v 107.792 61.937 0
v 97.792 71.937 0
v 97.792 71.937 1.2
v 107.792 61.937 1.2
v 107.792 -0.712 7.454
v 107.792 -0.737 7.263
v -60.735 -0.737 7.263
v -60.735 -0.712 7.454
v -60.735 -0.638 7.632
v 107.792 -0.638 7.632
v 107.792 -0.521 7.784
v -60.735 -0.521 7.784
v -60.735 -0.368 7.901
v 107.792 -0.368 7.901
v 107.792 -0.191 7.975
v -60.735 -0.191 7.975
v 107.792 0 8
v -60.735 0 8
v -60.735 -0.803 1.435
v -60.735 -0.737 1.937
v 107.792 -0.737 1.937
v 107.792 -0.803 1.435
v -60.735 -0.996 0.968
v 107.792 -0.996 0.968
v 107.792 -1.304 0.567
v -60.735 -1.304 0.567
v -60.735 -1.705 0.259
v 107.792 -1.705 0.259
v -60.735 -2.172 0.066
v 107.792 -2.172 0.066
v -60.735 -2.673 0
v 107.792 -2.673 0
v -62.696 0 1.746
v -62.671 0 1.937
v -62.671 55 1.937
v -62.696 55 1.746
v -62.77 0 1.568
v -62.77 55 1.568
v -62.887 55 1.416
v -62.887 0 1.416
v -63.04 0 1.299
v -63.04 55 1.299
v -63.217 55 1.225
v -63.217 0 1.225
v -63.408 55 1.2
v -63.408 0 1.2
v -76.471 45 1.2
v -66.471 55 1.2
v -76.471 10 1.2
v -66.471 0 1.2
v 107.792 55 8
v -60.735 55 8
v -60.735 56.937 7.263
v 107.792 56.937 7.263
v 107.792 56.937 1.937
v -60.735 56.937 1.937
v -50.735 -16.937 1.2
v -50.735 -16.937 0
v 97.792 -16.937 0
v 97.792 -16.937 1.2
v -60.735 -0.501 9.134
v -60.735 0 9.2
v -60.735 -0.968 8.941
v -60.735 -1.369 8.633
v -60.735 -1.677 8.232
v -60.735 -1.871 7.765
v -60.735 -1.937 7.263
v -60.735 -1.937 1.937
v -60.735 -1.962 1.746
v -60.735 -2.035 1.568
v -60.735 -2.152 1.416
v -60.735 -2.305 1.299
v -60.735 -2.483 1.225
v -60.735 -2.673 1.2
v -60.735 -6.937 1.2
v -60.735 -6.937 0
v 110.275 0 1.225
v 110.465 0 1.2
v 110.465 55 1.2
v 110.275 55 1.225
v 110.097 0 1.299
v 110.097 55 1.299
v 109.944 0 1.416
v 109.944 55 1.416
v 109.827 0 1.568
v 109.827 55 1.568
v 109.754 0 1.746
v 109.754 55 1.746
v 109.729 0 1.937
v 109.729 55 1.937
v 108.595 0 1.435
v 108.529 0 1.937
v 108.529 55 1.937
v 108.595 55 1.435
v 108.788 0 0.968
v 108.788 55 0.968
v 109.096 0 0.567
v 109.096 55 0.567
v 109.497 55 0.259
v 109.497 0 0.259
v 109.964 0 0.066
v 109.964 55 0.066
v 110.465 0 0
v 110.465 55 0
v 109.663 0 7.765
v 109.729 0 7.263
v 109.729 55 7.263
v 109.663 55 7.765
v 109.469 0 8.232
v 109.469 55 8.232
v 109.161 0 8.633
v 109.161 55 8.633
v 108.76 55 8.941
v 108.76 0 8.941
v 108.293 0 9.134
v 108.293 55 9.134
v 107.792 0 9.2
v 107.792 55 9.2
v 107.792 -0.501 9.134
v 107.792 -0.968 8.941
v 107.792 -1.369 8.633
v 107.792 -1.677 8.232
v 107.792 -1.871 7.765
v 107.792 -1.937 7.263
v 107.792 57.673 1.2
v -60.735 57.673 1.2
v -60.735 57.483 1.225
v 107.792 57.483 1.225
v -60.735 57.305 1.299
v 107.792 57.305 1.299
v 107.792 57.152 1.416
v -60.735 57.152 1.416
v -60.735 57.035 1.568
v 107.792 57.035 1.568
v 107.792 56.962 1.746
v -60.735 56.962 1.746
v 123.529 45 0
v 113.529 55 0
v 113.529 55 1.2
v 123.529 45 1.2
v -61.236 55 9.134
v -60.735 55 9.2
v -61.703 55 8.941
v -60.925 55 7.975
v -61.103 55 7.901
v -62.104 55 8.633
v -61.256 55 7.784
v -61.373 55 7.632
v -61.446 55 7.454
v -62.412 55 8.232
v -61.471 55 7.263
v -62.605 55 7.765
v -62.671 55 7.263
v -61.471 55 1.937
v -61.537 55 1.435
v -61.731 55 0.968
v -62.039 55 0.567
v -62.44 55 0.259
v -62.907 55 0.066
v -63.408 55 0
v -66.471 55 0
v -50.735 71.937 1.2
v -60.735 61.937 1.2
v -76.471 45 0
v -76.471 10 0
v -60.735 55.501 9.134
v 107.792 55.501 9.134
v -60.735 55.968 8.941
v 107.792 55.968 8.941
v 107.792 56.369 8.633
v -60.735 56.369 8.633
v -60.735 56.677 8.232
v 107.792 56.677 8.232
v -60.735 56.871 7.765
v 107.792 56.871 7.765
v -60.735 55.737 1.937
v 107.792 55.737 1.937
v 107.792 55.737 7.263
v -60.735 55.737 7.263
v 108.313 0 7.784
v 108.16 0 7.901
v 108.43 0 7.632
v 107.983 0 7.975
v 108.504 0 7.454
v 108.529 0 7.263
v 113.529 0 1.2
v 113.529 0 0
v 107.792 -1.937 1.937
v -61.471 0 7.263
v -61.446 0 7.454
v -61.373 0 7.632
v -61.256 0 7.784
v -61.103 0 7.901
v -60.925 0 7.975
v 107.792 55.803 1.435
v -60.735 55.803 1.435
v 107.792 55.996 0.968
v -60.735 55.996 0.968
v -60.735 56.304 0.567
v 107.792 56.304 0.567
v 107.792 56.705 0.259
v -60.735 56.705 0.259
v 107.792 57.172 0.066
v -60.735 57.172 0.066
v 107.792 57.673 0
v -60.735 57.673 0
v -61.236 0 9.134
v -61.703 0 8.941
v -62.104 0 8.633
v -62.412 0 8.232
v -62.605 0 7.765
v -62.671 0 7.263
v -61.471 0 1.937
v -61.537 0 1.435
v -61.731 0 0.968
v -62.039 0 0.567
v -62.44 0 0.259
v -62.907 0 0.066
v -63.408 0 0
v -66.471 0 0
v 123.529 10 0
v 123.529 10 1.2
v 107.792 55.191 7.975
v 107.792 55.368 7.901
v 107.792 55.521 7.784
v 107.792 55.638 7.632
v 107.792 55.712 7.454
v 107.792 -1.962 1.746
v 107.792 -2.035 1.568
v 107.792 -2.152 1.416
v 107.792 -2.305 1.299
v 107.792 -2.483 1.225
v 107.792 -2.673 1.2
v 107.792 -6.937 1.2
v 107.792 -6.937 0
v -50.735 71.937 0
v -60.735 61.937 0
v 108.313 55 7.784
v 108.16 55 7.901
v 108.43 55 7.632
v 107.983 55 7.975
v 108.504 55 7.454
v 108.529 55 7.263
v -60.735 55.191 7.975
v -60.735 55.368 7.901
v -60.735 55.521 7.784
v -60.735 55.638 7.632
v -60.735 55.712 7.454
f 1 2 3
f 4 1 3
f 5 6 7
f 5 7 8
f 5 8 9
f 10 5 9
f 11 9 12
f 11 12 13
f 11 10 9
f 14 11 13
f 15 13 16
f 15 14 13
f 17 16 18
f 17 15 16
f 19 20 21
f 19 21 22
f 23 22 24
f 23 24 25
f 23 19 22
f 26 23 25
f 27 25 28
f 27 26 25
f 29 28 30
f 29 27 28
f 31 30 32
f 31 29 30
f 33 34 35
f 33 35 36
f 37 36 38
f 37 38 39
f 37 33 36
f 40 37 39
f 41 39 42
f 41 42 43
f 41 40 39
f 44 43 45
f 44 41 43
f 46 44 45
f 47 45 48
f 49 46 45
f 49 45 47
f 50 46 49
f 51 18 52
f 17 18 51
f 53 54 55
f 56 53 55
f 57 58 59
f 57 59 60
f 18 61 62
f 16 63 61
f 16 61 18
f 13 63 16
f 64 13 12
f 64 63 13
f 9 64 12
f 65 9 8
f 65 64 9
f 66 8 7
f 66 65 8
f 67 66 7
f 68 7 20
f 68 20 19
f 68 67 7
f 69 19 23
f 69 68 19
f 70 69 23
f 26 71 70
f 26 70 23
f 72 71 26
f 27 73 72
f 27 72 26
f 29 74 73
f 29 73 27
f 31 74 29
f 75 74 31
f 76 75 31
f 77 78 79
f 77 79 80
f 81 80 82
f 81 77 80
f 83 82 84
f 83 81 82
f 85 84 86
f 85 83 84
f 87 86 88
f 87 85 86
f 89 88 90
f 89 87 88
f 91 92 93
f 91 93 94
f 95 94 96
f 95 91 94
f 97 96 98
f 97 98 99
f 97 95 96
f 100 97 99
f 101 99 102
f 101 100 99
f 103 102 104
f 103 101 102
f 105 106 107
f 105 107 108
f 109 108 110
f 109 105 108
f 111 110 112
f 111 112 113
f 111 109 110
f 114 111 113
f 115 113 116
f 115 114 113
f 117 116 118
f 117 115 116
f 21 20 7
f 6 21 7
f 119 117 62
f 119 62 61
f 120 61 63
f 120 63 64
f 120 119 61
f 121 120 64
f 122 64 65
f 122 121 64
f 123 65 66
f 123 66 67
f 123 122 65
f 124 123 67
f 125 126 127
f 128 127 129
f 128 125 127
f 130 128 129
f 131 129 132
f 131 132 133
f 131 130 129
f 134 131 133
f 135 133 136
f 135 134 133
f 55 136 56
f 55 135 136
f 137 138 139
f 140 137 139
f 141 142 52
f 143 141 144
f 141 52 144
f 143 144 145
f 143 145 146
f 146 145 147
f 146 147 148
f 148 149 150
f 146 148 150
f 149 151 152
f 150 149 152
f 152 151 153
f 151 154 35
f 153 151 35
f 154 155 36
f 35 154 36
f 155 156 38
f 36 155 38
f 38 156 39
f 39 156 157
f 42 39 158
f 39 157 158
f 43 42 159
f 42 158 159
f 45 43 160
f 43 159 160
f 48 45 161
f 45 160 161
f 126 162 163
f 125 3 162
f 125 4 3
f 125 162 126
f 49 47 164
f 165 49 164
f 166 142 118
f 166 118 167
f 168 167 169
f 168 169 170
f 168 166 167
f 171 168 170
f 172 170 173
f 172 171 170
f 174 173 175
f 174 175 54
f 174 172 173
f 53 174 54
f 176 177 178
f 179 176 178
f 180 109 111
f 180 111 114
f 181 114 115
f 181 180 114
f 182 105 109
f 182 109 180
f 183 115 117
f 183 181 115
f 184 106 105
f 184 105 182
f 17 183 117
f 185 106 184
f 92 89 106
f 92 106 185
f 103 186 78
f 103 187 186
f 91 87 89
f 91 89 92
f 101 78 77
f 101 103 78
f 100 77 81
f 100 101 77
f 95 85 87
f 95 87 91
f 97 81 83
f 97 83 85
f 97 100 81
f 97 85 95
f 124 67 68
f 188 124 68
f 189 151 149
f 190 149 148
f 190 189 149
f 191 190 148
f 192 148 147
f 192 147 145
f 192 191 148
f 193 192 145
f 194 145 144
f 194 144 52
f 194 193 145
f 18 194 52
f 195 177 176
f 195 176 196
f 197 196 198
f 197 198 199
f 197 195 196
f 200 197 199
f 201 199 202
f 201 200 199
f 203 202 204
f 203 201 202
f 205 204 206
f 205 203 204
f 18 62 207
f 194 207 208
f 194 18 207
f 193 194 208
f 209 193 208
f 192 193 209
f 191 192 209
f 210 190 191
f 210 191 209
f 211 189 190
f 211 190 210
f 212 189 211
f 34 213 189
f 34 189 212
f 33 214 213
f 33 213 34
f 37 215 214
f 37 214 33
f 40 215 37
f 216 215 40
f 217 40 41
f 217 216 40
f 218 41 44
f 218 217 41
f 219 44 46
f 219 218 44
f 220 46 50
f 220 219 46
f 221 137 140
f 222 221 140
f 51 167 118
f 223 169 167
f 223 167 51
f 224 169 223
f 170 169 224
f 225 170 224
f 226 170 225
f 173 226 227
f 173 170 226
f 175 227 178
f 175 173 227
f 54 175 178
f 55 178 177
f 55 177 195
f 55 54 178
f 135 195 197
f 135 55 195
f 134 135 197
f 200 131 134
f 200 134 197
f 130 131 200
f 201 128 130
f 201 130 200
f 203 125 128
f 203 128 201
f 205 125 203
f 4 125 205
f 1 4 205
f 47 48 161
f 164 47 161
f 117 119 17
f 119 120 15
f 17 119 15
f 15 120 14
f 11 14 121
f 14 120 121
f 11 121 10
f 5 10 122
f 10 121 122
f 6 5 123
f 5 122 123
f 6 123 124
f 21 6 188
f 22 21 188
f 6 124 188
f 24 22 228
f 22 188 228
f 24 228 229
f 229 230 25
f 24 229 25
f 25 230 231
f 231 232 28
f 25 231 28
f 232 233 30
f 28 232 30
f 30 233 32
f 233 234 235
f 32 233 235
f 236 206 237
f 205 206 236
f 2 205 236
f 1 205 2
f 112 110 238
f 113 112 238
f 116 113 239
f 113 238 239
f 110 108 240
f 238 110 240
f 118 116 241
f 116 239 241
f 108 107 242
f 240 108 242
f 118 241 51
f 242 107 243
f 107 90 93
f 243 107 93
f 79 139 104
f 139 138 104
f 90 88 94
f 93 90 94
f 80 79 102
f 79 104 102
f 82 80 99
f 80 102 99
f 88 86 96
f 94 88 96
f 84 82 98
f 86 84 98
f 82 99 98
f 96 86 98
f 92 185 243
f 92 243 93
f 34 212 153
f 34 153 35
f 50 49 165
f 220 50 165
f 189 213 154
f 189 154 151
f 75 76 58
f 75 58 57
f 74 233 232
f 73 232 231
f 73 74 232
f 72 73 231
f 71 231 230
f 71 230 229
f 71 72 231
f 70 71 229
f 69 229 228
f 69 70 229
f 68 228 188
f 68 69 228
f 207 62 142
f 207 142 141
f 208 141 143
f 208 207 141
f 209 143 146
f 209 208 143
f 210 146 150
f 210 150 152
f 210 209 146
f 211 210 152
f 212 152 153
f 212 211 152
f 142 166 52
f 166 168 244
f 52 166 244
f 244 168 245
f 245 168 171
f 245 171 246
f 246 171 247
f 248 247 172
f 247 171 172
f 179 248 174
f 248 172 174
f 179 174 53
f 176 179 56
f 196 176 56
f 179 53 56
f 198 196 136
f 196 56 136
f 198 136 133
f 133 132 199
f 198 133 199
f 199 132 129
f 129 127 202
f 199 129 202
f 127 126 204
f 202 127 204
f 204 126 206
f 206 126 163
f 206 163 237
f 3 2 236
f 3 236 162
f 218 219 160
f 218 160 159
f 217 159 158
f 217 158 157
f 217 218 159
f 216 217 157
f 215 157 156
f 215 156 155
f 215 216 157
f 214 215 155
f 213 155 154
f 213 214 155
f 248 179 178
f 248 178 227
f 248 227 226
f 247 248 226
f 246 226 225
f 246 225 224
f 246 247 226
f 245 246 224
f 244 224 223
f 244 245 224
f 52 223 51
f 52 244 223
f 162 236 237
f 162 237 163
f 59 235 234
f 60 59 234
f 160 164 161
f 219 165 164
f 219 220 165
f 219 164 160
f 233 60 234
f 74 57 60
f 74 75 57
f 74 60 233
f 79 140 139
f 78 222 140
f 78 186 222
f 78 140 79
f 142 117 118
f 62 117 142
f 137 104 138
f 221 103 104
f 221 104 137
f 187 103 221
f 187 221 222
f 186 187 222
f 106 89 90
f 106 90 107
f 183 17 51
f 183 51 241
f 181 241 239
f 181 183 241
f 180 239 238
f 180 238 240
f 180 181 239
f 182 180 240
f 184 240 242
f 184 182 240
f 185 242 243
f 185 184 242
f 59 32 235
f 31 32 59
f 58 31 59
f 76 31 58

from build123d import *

# Parameters (mm, degrees)
BASE_FLANGE1_DEPTH           = 55
EDGE_FLANGE1_DEPTH           = 168.5268
EDGE_FLANGE2_STRIP_W         = 6.2732
EDGE_FLANGE2_STRIP_H         = 1.2
EDGE_FLANGE2_STRIP_CUT_DEPTH = 168.5268
EDGE_FLANGE2_DEPTH           = 168.5268
EDGE_FLANGE3_DEPTH           = 168.5268
EDGE_FLANGE4_STRIP_W         = 6.2732
EDGE_FLANGE4_STRIP_H         = 1.2
EDGE_FLANGE4_STRIP_CUT_DEPTH = 168.5268
EDGE_FLANGE4_DEPTH           = 168.5268
CHAMFER1_SIZE                = 10


# Sheet-metal steps are written as plain solids
with BuildPart() as part:
    # Sketch1 → Base-Flange1 (new body)
    with BuildSketch(Plane(origin=(0, 0, 0), x_dir=(1, 0, 0), z_dir=(0, 1, 0))):
        with BuildLine():
            Line((-76.471389646, 0), (-63.407989646, 0))
            ThreePointArc((-63.407989646, 0), (-62.038606653, -0.567217008), (-61.471389646, -1.9366))
            Line((-61.471389646, -1.9366), (-61.471389646, -7.2634))
            ThreePointArc((-61.471389646, -7.2634), (-61.255644501, -7.784254855), (-60.734789646, -8))
            Line((-60.734789646, -8), (107.792010354, -8))
            ThreePointArc((107.792010354, -8), (108.312865209, -7.784254855), (108.528610354, -7.2634))
            Line((108.528610354, -7.2634), (108.528610354, -1.9366))
            ThreePointArc((108.528610354, -1.9366), (109.095827362, -0.567217008), (110.465210354, 0))
            Line((110.465210354, 0), (123.528610354, 0))
            Line((123.528610354, 0), (123.528610354, -1.2))
            Line((123.528610354, -1.2), (110.465210354, -1.2))
            ThreePointArc((110.465210354, -1.2), (109.944355499, -1.415745145), (109.728610354, -1.9366))
            Line((109.728610354, -1.9366), (109.728610354, -7.2634))
            ThreePointArc((109.728610354, -7.2634), (109.161393347, -8.632782992), (107.792010354, -9.2))
            Line((107.792010354, -9.2), (-60.734789646, -9.2))
            ThreePointArc((-60.734789646, -9.2), (-62.104172638, -8.632782992), (-62.671389646, -7.2634))
            Line((-62.671389646, -7.2634), (-62.671389646, -1.9366))
            ThreePointArc((-62.671389646, -1.9366), (-62.887134791, -1.415745145), (-63.407989646, -1.2))
            Line((-63.407989646, -1.2), (-76.471389646, -1.2))
            Line((-76.471389646, -1.2), (-76.471389646, 0))
        make_face()
    extrude(amount=BASE_FLANGE1_DEPTH)

    # Edge-Flange1 section (across the edge) → Edge-Flange1 (add)
    with BuildSketch(Plane(origin=(-60.734789646, 55.7366, 8), x_dir=(0, -1, 0), z_dir=(1, 0, 0))):
        with BuildLine():
            Line((-1.2, 0.7366), (-1.2, 8))
            Line((-1.2, 8), (0, 8))
            Line((0, 8), (0, 0.7366))
            ThreePointArc((0, 0.7366), (0.215745145, 0.215745145), (0.7366, 0))
            Line((0.7366, 0), (0.7366, -1.2))
            ThreePointArc((0.7366, -1.2), (-0.632782992, -0.632782992), (-1.2, 0.7366))
        make_face()
    extrude(amount=EDGE_FLANGE1_DEPTH)

    # Edge-Flange2 strip (across the edge) → Edge-Flange2 strip cut (cut)
    with BuildSketch(Plane(origin=(107.792010354, 56.9366, 0), x_dir=(0, 0, 1), z_dir=(-1, 0, 0))):
        with Locations((-1.2, -0.6)):
            Rectangle(EDGE_FLANGE2_STRIP_W, EDGE_FLANGE2_STRIP_H)
    extrude(amount=EDGE_FLANGE2_STRIP_CUT_DEPTH, mode=Mode.SUBTRACT)

    # Edge-Flange2 section (across the edge) → Edge-Flange2 (add)
    with BuildSketch(Plane(origin=(107.792010354, 56.9366, 0), x_dir=(0, 0, 1), z_dir=(-1, 0, 0))):
        with BuildLine():
            Line((0, 0.7366), (0, 15))
            Line((0, 15), (1.2, 15))
            Line((1.2, 15), (1.2, 0.7366))
            ThreePointArc((1.2, 0.7366), (1.415745145, 0.215745145), (1.9366, 0))
            Line((1.9366, 0), (1.9366, -1.2))
            ThreePointArc((1.9366, -1.2), (0.567217008, -0.632782992), (0, 0.7366))
        make_face()
    extrude(amount=EDGE_FLANGE2_DEPTH)

    # Edge-Flange3 section (across the edge) → Edge-Flange3 (add)
    with BuildSketch(Plane(origin=(107.792010354, -0.7366, 8), x_dir=(0, 1, 0), z_dir=(-1, 0, 0))):
        with BuildLine():
            Line((-1.2, 0.7366), (-1.2, 8))
            Line((-1.2, 8), (0, 8))
            Line((0, 8), (0, 0.7366))
            ThreePointArc((0, 0.7366), (0.215745145, 0.215745145), (0.7366, 0))
            Line((0.7366, 0), (0.7366, -1.2))
            ThreePointArc((0.7366, -1.2), (-0.632782992, -0.632782992), (-1.2, 0.7366))
        make_face()
    extrude(amount=EDGE_FLANGE3_DEPTH)

    # Edge-Flange4 strip (across the edge) → Edge-Flange4 strip cut (cut)
    with BuildSketch(Plane(origin=(-60.734789646, -1.9366, 0), x_dir=(0, 0, 1), z_dir=(1, 0, 0))):
        with Locations((-1.2, -0.6)):
            Rectangle(EDGE_FLANGE4_STRIP_W, EDGE_FLANGE4_STRIP_H)
    extrude(amount=EDGE_FLANGE4_STRIP_CUT_DEPTH, mode=Mode.SUBTRACT)

    # Edge-Flange4 section (across the edge) → Edge-Flange4 (add)
    with BuildSketch(Plane(origin=(-60.734789646, -1.9366, 0), x_dir=(0, 0, 1), z_dir=(1, 0, 0))):
        with BuildLine():
            Line((0, 0.7366), (0, 15))
            Line((0, 15), (1.2, 15))
            Line((1.2, 15), (1.2, 0.7366))
            ThreePointArc((1.2, 0.7366), (1.415745145, 0.215745145), (1.9366, 0))
            Line((1.9366, 0), (1.9366, -1.2))
            ThreePointArc((1.9366, -1.2), (0.567217008, -0.632782992), (0, 0.7366))
        make_face()
    extrude(amount=EDGE_FLANGE4_DEPTH)

    # Chamfer1
    chamfer1_edges = [part.edges().sort_by_distance(p)[0] for p in [
        (107.792010354, 71.9366, 0.6),
        (-60.734789646, 71.9366, 0.6),
        (-60.734789646, -16.9366, 0.6),
        (107.792010354, -16.9366, 0.6),
        (-76.471389646, 0, 0.6),
        (123.528610354, 0, 0.6),
        (-76.471389646, 55, 0.6),
        (123.528610354, 55, 0.6),
    ]]
    chamfer(chamfer1_edges, length=CHAMFER1_SIZE)


solid = part.part
